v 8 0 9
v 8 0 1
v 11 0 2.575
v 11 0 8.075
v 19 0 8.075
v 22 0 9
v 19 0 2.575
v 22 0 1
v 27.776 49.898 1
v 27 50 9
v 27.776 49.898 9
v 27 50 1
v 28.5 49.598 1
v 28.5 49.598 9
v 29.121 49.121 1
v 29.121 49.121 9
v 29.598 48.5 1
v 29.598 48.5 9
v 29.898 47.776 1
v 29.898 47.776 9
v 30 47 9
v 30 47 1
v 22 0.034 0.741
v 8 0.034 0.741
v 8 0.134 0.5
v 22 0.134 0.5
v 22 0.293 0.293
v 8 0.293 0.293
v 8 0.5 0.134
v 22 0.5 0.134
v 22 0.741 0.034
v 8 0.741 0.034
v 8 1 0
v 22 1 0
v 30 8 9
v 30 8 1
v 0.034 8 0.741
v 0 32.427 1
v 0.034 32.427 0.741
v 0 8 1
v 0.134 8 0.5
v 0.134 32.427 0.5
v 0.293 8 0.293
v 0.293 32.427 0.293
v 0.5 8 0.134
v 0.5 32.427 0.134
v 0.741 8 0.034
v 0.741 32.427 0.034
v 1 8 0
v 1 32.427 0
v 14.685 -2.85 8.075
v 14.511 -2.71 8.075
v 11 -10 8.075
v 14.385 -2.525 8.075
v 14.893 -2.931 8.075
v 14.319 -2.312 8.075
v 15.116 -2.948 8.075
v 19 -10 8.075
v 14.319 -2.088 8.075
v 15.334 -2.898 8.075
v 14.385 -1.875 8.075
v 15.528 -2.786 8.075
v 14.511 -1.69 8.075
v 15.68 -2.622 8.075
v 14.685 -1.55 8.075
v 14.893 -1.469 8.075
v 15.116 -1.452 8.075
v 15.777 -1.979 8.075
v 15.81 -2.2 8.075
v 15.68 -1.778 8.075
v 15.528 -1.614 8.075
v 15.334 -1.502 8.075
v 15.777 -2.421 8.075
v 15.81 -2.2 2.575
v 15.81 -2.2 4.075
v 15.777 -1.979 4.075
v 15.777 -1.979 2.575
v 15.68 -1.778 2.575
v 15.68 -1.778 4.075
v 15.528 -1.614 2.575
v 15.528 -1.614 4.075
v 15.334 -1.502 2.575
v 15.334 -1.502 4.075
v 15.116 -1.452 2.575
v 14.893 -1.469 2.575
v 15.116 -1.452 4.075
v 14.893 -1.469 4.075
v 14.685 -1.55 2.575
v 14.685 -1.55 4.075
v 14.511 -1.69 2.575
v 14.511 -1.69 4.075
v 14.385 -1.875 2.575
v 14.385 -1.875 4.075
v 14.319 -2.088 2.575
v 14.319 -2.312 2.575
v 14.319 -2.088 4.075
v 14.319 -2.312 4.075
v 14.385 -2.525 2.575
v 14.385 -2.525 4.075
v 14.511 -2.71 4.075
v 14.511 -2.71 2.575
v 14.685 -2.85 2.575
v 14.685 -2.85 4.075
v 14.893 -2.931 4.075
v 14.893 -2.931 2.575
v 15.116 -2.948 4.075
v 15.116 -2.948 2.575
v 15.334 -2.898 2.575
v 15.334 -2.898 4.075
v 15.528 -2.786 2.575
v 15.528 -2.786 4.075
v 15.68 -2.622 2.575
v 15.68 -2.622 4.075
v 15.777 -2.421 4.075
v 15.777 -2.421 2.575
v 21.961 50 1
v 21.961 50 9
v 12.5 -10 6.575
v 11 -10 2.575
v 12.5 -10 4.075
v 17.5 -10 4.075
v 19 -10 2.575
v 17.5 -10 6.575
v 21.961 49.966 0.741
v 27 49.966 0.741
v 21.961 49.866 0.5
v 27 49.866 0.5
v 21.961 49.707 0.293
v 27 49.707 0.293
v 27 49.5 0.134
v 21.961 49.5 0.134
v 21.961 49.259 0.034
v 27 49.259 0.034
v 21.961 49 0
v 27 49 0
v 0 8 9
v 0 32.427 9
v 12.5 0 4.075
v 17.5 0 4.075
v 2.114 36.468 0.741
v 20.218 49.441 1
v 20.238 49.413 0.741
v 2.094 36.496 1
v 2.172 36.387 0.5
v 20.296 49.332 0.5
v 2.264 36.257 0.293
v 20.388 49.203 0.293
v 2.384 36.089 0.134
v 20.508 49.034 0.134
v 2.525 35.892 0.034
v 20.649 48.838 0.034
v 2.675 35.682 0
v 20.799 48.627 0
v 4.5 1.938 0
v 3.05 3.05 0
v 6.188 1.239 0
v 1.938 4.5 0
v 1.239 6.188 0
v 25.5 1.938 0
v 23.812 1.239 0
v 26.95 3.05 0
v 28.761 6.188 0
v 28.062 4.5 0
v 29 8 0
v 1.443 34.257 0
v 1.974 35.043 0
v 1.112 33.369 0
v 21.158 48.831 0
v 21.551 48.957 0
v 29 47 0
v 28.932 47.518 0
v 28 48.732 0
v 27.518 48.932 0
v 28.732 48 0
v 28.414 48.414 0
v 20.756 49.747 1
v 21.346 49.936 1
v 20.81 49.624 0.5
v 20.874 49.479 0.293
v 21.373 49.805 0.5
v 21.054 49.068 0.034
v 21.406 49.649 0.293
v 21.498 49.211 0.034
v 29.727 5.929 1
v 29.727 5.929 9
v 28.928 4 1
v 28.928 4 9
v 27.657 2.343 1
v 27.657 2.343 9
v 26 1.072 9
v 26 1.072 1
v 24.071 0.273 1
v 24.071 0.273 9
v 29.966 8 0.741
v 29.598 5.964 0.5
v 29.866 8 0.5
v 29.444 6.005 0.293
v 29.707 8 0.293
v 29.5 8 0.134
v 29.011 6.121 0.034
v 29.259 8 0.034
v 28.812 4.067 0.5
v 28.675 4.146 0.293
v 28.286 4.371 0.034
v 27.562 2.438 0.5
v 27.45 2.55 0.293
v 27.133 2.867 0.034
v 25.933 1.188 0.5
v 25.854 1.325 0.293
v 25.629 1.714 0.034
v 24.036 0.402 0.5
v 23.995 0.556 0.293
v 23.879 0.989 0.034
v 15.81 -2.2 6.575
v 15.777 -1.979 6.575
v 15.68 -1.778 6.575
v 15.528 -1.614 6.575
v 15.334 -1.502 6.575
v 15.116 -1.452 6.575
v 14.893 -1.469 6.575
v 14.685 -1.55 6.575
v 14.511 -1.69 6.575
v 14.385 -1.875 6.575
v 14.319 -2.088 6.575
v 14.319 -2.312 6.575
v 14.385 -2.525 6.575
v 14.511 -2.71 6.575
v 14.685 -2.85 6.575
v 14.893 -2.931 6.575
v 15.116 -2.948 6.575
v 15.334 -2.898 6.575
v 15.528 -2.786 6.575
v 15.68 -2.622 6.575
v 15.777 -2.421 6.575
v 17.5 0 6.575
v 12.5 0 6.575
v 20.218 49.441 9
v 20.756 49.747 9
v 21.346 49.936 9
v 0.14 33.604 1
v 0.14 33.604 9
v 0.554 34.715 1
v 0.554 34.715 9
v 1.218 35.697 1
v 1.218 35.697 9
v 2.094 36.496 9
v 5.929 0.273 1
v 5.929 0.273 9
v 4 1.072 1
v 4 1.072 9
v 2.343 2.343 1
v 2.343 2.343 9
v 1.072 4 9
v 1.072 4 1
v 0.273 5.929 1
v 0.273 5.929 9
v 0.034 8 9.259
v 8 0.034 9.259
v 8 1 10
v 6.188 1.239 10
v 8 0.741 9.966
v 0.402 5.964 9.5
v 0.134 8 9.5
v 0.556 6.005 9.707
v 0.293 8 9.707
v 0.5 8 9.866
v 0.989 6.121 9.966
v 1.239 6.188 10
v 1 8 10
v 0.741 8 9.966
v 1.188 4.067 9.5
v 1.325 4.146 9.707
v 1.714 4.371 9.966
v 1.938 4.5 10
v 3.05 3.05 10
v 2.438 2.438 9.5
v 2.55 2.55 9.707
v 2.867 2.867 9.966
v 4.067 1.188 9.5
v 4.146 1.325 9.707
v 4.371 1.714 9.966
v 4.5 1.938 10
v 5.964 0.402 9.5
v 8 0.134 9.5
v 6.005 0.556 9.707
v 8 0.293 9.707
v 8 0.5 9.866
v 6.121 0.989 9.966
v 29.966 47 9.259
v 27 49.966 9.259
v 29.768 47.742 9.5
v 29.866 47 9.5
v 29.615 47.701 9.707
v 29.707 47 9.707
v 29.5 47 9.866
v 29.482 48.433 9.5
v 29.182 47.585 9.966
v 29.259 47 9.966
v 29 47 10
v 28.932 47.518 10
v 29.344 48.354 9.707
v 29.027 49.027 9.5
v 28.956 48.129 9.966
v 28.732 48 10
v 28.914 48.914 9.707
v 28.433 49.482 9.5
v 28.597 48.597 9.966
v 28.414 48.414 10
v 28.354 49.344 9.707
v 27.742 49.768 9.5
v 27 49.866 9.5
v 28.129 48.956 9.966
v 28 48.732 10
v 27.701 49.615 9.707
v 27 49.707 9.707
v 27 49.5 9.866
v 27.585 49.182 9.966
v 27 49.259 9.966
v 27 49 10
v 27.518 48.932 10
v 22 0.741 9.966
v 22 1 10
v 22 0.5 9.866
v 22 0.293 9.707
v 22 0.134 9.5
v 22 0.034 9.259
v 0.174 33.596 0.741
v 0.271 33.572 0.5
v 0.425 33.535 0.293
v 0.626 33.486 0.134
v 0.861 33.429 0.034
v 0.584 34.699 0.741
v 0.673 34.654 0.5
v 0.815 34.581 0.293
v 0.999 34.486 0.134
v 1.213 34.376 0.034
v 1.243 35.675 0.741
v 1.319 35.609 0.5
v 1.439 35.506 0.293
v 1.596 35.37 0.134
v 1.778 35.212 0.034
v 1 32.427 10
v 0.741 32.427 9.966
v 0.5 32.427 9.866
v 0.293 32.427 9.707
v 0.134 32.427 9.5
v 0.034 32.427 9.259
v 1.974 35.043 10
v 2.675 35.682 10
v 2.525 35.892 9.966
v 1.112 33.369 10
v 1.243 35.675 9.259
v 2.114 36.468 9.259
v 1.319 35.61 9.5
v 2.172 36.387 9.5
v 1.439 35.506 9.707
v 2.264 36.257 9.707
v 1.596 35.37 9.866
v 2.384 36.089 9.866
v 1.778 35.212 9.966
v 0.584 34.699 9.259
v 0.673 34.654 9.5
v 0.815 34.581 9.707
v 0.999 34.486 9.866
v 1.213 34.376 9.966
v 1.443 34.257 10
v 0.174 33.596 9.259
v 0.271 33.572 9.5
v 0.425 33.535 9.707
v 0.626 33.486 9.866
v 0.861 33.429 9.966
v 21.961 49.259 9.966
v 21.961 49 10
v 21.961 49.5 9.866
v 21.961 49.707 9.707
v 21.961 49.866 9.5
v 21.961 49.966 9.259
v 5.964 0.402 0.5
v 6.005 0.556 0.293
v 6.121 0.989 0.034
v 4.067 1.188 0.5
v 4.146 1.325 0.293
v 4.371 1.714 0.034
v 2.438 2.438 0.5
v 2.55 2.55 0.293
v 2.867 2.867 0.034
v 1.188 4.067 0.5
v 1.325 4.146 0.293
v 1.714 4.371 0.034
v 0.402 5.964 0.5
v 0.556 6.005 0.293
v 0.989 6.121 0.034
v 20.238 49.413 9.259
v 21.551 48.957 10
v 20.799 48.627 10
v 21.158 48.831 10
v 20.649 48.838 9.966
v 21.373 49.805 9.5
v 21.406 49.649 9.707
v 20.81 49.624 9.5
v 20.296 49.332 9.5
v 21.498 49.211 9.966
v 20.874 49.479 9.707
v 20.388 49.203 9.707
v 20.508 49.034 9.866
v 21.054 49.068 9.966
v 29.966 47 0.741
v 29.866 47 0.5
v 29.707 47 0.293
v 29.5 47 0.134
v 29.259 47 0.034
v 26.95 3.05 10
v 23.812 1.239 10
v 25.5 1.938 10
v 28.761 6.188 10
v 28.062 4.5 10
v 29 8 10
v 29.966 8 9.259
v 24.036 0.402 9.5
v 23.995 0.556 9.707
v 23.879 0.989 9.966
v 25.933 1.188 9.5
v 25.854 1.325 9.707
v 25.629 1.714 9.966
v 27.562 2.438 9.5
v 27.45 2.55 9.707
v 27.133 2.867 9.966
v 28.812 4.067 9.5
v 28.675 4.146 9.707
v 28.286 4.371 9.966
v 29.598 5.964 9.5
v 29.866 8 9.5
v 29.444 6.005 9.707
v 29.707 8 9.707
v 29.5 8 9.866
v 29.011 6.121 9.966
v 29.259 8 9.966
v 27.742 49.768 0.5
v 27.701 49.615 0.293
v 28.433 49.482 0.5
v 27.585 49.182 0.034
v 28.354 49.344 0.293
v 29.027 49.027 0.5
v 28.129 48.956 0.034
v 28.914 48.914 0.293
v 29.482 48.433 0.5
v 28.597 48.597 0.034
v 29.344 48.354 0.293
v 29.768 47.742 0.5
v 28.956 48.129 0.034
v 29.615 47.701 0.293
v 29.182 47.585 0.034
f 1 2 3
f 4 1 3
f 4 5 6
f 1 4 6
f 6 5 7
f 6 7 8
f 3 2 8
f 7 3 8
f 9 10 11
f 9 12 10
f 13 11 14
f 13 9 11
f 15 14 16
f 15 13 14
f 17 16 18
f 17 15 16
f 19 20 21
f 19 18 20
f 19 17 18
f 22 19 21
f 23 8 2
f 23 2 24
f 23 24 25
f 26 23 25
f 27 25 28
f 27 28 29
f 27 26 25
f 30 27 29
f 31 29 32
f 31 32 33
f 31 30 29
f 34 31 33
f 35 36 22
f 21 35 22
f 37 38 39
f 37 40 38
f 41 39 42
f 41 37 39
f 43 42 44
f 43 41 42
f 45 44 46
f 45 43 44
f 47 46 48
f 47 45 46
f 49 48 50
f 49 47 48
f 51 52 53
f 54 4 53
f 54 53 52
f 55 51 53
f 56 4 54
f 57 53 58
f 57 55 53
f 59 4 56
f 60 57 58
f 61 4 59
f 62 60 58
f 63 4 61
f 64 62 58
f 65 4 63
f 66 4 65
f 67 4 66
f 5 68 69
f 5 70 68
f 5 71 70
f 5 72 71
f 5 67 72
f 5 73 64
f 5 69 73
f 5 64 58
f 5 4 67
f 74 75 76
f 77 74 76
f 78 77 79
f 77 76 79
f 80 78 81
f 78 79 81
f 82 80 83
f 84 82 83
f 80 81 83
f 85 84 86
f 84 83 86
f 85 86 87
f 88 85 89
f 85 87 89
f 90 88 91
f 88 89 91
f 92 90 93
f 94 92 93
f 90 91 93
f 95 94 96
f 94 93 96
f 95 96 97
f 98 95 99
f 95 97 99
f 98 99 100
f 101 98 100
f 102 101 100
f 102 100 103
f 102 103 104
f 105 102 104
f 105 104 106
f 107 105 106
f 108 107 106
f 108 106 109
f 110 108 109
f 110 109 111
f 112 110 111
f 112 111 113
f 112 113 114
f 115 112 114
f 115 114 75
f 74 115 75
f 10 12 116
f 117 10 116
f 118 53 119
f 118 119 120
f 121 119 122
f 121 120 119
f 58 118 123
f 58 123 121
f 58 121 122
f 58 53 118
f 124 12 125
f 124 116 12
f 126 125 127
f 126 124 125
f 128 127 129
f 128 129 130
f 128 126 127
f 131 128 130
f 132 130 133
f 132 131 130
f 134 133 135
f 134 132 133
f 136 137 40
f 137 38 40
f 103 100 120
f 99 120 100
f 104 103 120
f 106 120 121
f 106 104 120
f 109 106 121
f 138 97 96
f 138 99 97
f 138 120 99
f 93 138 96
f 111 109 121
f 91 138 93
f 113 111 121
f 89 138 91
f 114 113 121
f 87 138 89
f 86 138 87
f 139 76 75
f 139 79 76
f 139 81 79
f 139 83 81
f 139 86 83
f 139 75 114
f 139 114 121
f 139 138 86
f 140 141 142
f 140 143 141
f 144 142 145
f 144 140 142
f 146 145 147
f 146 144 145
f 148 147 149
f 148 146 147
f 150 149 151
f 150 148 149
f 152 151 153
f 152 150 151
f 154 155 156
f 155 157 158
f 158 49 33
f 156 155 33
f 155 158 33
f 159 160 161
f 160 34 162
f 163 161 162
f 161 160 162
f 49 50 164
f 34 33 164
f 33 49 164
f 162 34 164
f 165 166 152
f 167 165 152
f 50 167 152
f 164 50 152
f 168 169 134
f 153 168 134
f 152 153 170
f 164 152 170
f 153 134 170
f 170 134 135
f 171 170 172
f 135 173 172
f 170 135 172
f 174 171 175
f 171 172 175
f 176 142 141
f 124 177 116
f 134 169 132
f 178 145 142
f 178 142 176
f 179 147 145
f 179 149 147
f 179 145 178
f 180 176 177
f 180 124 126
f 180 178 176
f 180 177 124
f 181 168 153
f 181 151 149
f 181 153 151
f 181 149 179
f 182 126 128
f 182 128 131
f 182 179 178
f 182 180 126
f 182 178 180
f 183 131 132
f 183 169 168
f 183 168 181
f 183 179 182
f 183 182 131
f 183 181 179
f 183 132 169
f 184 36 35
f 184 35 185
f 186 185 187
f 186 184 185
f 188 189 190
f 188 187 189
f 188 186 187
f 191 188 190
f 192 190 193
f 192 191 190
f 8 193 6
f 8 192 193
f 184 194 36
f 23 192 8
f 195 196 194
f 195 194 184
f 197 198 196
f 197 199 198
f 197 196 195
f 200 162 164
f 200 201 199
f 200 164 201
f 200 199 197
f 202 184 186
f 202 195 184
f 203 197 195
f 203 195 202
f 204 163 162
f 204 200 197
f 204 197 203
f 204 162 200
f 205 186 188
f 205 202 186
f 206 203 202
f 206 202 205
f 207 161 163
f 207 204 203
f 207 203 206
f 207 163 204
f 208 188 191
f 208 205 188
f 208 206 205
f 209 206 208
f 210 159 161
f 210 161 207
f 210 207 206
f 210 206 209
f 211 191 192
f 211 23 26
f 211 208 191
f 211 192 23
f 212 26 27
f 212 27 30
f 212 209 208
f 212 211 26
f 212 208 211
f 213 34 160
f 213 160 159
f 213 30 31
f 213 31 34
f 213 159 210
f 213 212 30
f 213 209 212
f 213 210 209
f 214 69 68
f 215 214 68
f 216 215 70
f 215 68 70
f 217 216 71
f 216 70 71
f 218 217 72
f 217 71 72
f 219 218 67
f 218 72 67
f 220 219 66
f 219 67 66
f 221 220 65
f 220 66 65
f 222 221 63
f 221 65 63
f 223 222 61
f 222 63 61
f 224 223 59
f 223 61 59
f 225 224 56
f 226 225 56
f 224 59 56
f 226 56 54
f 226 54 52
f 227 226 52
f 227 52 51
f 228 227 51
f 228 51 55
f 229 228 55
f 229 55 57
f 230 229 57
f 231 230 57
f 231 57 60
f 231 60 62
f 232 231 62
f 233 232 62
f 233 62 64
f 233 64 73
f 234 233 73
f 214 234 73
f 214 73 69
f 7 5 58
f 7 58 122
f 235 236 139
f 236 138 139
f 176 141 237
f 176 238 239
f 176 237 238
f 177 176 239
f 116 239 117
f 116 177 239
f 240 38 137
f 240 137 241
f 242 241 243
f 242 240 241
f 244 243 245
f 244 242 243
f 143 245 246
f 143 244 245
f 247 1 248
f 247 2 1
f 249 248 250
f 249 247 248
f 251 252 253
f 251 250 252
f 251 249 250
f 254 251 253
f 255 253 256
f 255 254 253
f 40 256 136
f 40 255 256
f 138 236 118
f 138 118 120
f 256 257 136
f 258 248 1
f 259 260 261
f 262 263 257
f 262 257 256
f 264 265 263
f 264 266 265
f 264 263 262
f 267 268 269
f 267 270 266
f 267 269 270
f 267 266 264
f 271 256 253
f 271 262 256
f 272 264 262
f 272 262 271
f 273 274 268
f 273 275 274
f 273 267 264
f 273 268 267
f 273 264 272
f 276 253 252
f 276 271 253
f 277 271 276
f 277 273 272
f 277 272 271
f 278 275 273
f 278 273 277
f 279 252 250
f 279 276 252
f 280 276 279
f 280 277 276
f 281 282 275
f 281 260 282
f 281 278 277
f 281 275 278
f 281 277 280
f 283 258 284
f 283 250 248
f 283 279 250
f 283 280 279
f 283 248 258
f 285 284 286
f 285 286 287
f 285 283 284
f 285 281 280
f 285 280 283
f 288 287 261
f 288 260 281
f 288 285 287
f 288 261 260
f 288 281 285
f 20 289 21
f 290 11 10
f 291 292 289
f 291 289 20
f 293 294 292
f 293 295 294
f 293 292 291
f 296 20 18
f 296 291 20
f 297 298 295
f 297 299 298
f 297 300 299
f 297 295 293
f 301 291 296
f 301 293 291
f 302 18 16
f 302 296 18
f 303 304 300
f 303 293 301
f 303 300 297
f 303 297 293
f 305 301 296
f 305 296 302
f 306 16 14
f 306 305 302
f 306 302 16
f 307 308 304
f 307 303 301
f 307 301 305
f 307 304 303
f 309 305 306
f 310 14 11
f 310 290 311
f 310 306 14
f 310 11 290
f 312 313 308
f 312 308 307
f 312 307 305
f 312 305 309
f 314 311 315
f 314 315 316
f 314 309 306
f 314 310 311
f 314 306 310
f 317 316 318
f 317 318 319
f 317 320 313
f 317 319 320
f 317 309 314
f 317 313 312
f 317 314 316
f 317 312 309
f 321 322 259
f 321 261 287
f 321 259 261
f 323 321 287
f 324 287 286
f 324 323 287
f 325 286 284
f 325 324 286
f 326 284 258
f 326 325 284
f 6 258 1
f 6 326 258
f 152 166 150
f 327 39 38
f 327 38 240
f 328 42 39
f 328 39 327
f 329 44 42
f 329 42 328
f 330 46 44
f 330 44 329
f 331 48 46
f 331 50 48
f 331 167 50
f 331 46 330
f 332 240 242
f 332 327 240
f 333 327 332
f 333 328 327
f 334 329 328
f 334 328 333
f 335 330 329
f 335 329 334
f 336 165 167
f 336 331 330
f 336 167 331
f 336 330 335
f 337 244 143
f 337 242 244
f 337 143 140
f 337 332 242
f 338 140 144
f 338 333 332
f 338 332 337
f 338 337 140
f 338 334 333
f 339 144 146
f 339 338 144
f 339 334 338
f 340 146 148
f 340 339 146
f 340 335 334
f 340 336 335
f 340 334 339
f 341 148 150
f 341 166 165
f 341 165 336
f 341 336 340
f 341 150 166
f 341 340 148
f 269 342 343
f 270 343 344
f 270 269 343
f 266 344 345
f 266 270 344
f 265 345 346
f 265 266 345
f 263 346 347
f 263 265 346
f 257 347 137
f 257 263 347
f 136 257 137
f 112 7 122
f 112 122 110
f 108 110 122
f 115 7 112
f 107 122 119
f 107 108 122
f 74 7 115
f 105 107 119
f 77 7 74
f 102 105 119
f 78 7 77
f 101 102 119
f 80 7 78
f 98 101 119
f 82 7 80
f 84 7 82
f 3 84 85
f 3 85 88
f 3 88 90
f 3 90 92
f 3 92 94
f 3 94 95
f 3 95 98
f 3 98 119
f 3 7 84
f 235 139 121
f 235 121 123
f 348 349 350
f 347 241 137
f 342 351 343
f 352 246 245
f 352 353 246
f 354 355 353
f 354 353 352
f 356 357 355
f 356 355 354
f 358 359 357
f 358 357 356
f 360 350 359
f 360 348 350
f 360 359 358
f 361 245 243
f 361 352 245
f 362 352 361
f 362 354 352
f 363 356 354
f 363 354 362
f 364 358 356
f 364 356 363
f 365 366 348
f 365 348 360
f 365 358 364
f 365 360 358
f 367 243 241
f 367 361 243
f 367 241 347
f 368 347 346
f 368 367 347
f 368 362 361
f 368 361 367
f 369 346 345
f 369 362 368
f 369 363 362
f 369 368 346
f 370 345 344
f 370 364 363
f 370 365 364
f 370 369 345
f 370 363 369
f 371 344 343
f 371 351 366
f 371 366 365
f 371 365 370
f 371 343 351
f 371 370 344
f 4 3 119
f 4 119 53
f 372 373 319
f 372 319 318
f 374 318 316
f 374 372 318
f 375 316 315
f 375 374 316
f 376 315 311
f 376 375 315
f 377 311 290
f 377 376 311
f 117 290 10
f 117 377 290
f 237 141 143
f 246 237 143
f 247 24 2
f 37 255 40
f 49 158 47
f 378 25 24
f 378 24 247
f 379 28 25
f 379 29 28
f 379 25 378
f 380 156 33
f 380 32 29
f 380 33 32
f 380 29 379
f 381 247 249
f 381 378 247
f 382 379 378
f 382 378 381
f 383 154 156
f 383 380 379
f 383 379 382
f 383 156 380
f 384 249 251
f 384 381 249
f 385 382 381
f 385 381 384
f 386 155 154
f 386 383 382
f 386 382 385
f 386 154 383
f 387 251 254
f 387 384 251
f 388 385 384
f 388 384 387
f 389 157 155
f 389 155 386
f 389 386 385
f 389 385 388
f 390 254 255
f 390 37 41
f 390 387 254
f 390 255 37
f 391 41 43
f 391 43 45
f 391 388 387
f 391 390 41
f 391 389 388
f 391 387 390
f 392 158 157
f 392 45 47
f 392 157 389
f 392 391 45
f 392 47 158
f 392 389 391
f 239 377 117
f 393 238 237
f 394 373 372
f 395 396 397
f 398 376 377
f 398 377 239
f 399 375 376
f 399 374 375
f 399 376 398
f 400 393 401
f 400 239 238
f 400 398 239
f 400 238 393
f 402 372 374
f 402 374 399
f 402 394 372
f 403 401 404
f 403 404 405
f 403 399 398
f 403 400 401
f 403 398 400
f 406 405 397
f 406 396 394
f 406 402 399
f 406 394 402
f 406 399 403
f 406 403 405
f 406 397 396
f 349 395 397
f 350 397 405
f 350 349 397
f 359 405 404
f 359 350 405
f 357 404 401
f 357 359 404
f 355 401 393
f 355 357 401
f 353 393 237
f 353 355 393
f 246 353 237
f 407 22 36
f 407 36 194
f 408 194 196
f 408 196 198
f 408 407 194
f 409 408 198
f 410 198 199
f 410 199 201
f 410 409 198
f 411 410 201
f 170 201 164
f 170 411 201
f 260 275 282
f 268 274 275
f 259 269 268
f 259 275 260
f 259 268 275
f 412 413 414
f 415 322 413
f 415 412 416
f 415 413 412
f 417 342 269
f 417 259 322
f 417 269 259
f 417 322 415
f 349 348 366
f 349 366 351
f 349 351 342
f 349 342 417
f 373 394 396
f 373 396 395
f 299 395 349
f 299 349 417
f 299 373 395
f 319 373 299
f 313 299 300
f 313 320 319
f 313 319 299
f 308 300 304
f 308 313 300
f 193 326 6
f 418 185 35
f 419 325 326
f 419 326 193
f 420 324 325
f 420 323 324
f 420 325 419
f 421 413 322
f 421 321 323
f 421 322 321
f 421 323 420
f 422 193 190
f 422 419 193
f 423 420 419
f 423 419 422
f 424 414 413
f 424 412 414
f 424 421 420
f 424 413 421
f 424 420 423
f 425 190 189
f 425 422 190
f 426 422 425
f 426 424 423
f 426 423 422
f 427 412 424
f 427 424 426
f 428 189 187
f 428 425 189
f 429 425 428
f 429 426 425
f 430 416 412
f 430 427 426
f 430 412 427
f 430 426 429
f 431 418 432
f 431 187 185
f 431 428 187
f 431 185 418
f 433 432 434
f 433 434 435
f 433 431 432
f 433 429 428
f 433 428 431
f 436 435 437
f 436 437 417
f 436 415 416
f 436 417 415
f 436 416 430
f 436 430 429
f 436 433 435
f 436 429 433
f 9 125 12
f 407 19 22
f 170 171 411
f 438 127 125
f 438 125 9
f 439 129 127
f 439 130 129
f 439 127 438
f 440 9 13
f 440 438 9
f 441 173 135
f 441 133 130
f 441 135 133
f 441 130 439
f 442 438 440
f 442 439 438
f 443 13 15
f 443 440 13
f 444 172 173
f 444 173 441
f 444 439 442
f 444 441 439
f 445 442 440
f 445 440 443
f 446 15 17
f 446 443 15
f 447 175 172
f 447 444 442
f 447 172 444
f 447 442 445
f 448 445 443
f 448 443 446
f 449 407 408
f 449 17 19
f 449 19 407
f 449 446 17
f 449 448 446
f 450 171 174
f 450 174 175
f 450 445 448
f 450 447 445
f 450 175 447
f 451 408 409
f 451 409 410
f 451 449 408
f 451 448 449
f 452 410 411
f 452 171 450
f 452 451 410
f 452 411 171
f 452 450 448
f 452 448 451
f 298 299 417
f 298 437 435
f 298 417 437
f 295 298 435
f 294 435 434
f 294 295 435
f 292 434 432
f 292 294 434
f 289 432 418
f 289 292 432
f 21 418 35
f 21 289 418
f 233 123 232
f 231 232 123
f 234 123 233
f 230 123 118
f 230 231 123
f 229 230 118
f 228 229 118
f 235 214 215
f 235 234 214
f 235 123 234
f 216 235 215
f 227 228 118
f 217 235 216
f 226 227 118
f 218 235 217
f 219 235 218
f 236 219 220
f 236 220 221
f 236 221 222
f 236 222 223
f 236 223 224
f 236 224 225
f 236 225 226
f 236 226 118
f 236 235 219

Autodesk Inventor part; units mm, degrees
ref_plane "YZ Plane" through (0, 0, 0) normal (1, 0, 0) x (0, 1, 0)
ref_plane "XZ Plane" through (0, 0, 0) normal (0, 1, 0) x (-1, 0, 0)
ref_plane "XY Plane" through (0, 0, 0) normal (0, 0, 1) x (1, 0, 0)
sketch "Sketch1" plane through (0, 0, 0) normal (0, 0, 1) x (1, 0, 0)
  line L0 (8, 0) -> (22, 0)
  line L1 (30, 8) -> (30, 47)
  line L2 (27, 50) -> (0, 50)
  line L3 (0, 32.4269) -> (0, 8)
  line L4 (0, 50) -> (0, 35)
  line L5 (30, 50) -> (21.9614, 50)
  line L6 (20.2177, 49.4412) -> (2.0938, 36.4956)
  arc A0 (0, 8) -> (8, 0) centre (8, 8) ccw
  arc A1 (22, 0) -> (30, 8) centre (22, 8) ccw
  arc A2 (30, 47) -> (27, 50) centre (27, 47) ccw
  arc A3 (2.0938, 36.4956) -> (0, 32.4269) centre (5, 32.4269) ccw
  arc A4 (21.9614, 50) -> (20.2177, 49.4412) centre (21.9614, 47) ccw
  point P0 (0, 0)
  point P1 (30, 0)
  point P2 (21, 50)
  dimension "d0" = 30
  dimension "d1" = 50
  dimension "d2" = 15
  dimension "d3" = 9
  dimension "d4" = 8
  dimension "d21" = 3
  dimension "d22" = 5
  dimension "d23" = 3
extrude "Extrusion1" add sketch "Sketch1" along normal blind 10
fillet "Fillet1" radius 1 14 edges at (2.3431, 2.3431, 10) (15, 0, 10) (27.6569, 2.3431, 10) (30, 27.5, 10) (0, 20.2135, 10) (11.1557, 42.9684, 10) (24.4807, 50, 10) (24.4807, 50, 0) (11.1557, 42.9684, 0) (2.3431, 2.3431, 0) (15, 0, 0) (27.6569, 2.3431, 0) (30, 27.5, 0) (0, 20.2135, 0)
sketch "Sketch2" plane through (8, 0, 9) normal (0, -1, 0) x (1, 0, 0)
  line L0 (4.5, -4.925) -> (9.5, -4.925)
  line L1 (9.5, -4.925) -> (9.5, -2.425)
  line L2 (9.5, -2.425) -> (4.5, -2.425)
  line L3 (4.5, -2.425) -> (4.5, -4.925)
  line L4 (22, -8) -> (22, 0) projected
  line L5 (-8, -8) -> (-8, 0) projected
  line L6 (0, -9) -> (14, -9) projected
  line L7 (14, 1) -> (0, 1) projected
  line L8 (11, -6.425) -> (3, -6.425)
  line L9 (3, -6.425) -> (3, -0.925)
  line L10 (3, -0.925) -> (11, -0.925)
  line L11 (11, -0.925) -> (11, -6.425)
  point P0 (-8, -9)
  dimension "d8" = 5
  dimension "d9" = 2.5
  dimension "d10" = 30
  dimension "d11" = 12.5
  dimension "d12" = 10
  dimension "d13" = 3.425
  dimension "d14" = 1.5
extrude "Extrusion2" add sketch "Sketch2" along normal blind 10
sketch "Sketch3" plane through (11, 0, 8.075) normal (0, 0, 1) x (1, 0, 0)
  circle A0 centre (4.0603, -2.2) radius 0.75
  line L0 (8, -10) -> (0, -10) projected
  point P0 (-11, 0)
  dimension "d17" = 1.5
  dimension "d18" = 7.8
extrude "Extrusion3" cut sketch "Sketch3" against normal up to surface (5.5 mm away)
